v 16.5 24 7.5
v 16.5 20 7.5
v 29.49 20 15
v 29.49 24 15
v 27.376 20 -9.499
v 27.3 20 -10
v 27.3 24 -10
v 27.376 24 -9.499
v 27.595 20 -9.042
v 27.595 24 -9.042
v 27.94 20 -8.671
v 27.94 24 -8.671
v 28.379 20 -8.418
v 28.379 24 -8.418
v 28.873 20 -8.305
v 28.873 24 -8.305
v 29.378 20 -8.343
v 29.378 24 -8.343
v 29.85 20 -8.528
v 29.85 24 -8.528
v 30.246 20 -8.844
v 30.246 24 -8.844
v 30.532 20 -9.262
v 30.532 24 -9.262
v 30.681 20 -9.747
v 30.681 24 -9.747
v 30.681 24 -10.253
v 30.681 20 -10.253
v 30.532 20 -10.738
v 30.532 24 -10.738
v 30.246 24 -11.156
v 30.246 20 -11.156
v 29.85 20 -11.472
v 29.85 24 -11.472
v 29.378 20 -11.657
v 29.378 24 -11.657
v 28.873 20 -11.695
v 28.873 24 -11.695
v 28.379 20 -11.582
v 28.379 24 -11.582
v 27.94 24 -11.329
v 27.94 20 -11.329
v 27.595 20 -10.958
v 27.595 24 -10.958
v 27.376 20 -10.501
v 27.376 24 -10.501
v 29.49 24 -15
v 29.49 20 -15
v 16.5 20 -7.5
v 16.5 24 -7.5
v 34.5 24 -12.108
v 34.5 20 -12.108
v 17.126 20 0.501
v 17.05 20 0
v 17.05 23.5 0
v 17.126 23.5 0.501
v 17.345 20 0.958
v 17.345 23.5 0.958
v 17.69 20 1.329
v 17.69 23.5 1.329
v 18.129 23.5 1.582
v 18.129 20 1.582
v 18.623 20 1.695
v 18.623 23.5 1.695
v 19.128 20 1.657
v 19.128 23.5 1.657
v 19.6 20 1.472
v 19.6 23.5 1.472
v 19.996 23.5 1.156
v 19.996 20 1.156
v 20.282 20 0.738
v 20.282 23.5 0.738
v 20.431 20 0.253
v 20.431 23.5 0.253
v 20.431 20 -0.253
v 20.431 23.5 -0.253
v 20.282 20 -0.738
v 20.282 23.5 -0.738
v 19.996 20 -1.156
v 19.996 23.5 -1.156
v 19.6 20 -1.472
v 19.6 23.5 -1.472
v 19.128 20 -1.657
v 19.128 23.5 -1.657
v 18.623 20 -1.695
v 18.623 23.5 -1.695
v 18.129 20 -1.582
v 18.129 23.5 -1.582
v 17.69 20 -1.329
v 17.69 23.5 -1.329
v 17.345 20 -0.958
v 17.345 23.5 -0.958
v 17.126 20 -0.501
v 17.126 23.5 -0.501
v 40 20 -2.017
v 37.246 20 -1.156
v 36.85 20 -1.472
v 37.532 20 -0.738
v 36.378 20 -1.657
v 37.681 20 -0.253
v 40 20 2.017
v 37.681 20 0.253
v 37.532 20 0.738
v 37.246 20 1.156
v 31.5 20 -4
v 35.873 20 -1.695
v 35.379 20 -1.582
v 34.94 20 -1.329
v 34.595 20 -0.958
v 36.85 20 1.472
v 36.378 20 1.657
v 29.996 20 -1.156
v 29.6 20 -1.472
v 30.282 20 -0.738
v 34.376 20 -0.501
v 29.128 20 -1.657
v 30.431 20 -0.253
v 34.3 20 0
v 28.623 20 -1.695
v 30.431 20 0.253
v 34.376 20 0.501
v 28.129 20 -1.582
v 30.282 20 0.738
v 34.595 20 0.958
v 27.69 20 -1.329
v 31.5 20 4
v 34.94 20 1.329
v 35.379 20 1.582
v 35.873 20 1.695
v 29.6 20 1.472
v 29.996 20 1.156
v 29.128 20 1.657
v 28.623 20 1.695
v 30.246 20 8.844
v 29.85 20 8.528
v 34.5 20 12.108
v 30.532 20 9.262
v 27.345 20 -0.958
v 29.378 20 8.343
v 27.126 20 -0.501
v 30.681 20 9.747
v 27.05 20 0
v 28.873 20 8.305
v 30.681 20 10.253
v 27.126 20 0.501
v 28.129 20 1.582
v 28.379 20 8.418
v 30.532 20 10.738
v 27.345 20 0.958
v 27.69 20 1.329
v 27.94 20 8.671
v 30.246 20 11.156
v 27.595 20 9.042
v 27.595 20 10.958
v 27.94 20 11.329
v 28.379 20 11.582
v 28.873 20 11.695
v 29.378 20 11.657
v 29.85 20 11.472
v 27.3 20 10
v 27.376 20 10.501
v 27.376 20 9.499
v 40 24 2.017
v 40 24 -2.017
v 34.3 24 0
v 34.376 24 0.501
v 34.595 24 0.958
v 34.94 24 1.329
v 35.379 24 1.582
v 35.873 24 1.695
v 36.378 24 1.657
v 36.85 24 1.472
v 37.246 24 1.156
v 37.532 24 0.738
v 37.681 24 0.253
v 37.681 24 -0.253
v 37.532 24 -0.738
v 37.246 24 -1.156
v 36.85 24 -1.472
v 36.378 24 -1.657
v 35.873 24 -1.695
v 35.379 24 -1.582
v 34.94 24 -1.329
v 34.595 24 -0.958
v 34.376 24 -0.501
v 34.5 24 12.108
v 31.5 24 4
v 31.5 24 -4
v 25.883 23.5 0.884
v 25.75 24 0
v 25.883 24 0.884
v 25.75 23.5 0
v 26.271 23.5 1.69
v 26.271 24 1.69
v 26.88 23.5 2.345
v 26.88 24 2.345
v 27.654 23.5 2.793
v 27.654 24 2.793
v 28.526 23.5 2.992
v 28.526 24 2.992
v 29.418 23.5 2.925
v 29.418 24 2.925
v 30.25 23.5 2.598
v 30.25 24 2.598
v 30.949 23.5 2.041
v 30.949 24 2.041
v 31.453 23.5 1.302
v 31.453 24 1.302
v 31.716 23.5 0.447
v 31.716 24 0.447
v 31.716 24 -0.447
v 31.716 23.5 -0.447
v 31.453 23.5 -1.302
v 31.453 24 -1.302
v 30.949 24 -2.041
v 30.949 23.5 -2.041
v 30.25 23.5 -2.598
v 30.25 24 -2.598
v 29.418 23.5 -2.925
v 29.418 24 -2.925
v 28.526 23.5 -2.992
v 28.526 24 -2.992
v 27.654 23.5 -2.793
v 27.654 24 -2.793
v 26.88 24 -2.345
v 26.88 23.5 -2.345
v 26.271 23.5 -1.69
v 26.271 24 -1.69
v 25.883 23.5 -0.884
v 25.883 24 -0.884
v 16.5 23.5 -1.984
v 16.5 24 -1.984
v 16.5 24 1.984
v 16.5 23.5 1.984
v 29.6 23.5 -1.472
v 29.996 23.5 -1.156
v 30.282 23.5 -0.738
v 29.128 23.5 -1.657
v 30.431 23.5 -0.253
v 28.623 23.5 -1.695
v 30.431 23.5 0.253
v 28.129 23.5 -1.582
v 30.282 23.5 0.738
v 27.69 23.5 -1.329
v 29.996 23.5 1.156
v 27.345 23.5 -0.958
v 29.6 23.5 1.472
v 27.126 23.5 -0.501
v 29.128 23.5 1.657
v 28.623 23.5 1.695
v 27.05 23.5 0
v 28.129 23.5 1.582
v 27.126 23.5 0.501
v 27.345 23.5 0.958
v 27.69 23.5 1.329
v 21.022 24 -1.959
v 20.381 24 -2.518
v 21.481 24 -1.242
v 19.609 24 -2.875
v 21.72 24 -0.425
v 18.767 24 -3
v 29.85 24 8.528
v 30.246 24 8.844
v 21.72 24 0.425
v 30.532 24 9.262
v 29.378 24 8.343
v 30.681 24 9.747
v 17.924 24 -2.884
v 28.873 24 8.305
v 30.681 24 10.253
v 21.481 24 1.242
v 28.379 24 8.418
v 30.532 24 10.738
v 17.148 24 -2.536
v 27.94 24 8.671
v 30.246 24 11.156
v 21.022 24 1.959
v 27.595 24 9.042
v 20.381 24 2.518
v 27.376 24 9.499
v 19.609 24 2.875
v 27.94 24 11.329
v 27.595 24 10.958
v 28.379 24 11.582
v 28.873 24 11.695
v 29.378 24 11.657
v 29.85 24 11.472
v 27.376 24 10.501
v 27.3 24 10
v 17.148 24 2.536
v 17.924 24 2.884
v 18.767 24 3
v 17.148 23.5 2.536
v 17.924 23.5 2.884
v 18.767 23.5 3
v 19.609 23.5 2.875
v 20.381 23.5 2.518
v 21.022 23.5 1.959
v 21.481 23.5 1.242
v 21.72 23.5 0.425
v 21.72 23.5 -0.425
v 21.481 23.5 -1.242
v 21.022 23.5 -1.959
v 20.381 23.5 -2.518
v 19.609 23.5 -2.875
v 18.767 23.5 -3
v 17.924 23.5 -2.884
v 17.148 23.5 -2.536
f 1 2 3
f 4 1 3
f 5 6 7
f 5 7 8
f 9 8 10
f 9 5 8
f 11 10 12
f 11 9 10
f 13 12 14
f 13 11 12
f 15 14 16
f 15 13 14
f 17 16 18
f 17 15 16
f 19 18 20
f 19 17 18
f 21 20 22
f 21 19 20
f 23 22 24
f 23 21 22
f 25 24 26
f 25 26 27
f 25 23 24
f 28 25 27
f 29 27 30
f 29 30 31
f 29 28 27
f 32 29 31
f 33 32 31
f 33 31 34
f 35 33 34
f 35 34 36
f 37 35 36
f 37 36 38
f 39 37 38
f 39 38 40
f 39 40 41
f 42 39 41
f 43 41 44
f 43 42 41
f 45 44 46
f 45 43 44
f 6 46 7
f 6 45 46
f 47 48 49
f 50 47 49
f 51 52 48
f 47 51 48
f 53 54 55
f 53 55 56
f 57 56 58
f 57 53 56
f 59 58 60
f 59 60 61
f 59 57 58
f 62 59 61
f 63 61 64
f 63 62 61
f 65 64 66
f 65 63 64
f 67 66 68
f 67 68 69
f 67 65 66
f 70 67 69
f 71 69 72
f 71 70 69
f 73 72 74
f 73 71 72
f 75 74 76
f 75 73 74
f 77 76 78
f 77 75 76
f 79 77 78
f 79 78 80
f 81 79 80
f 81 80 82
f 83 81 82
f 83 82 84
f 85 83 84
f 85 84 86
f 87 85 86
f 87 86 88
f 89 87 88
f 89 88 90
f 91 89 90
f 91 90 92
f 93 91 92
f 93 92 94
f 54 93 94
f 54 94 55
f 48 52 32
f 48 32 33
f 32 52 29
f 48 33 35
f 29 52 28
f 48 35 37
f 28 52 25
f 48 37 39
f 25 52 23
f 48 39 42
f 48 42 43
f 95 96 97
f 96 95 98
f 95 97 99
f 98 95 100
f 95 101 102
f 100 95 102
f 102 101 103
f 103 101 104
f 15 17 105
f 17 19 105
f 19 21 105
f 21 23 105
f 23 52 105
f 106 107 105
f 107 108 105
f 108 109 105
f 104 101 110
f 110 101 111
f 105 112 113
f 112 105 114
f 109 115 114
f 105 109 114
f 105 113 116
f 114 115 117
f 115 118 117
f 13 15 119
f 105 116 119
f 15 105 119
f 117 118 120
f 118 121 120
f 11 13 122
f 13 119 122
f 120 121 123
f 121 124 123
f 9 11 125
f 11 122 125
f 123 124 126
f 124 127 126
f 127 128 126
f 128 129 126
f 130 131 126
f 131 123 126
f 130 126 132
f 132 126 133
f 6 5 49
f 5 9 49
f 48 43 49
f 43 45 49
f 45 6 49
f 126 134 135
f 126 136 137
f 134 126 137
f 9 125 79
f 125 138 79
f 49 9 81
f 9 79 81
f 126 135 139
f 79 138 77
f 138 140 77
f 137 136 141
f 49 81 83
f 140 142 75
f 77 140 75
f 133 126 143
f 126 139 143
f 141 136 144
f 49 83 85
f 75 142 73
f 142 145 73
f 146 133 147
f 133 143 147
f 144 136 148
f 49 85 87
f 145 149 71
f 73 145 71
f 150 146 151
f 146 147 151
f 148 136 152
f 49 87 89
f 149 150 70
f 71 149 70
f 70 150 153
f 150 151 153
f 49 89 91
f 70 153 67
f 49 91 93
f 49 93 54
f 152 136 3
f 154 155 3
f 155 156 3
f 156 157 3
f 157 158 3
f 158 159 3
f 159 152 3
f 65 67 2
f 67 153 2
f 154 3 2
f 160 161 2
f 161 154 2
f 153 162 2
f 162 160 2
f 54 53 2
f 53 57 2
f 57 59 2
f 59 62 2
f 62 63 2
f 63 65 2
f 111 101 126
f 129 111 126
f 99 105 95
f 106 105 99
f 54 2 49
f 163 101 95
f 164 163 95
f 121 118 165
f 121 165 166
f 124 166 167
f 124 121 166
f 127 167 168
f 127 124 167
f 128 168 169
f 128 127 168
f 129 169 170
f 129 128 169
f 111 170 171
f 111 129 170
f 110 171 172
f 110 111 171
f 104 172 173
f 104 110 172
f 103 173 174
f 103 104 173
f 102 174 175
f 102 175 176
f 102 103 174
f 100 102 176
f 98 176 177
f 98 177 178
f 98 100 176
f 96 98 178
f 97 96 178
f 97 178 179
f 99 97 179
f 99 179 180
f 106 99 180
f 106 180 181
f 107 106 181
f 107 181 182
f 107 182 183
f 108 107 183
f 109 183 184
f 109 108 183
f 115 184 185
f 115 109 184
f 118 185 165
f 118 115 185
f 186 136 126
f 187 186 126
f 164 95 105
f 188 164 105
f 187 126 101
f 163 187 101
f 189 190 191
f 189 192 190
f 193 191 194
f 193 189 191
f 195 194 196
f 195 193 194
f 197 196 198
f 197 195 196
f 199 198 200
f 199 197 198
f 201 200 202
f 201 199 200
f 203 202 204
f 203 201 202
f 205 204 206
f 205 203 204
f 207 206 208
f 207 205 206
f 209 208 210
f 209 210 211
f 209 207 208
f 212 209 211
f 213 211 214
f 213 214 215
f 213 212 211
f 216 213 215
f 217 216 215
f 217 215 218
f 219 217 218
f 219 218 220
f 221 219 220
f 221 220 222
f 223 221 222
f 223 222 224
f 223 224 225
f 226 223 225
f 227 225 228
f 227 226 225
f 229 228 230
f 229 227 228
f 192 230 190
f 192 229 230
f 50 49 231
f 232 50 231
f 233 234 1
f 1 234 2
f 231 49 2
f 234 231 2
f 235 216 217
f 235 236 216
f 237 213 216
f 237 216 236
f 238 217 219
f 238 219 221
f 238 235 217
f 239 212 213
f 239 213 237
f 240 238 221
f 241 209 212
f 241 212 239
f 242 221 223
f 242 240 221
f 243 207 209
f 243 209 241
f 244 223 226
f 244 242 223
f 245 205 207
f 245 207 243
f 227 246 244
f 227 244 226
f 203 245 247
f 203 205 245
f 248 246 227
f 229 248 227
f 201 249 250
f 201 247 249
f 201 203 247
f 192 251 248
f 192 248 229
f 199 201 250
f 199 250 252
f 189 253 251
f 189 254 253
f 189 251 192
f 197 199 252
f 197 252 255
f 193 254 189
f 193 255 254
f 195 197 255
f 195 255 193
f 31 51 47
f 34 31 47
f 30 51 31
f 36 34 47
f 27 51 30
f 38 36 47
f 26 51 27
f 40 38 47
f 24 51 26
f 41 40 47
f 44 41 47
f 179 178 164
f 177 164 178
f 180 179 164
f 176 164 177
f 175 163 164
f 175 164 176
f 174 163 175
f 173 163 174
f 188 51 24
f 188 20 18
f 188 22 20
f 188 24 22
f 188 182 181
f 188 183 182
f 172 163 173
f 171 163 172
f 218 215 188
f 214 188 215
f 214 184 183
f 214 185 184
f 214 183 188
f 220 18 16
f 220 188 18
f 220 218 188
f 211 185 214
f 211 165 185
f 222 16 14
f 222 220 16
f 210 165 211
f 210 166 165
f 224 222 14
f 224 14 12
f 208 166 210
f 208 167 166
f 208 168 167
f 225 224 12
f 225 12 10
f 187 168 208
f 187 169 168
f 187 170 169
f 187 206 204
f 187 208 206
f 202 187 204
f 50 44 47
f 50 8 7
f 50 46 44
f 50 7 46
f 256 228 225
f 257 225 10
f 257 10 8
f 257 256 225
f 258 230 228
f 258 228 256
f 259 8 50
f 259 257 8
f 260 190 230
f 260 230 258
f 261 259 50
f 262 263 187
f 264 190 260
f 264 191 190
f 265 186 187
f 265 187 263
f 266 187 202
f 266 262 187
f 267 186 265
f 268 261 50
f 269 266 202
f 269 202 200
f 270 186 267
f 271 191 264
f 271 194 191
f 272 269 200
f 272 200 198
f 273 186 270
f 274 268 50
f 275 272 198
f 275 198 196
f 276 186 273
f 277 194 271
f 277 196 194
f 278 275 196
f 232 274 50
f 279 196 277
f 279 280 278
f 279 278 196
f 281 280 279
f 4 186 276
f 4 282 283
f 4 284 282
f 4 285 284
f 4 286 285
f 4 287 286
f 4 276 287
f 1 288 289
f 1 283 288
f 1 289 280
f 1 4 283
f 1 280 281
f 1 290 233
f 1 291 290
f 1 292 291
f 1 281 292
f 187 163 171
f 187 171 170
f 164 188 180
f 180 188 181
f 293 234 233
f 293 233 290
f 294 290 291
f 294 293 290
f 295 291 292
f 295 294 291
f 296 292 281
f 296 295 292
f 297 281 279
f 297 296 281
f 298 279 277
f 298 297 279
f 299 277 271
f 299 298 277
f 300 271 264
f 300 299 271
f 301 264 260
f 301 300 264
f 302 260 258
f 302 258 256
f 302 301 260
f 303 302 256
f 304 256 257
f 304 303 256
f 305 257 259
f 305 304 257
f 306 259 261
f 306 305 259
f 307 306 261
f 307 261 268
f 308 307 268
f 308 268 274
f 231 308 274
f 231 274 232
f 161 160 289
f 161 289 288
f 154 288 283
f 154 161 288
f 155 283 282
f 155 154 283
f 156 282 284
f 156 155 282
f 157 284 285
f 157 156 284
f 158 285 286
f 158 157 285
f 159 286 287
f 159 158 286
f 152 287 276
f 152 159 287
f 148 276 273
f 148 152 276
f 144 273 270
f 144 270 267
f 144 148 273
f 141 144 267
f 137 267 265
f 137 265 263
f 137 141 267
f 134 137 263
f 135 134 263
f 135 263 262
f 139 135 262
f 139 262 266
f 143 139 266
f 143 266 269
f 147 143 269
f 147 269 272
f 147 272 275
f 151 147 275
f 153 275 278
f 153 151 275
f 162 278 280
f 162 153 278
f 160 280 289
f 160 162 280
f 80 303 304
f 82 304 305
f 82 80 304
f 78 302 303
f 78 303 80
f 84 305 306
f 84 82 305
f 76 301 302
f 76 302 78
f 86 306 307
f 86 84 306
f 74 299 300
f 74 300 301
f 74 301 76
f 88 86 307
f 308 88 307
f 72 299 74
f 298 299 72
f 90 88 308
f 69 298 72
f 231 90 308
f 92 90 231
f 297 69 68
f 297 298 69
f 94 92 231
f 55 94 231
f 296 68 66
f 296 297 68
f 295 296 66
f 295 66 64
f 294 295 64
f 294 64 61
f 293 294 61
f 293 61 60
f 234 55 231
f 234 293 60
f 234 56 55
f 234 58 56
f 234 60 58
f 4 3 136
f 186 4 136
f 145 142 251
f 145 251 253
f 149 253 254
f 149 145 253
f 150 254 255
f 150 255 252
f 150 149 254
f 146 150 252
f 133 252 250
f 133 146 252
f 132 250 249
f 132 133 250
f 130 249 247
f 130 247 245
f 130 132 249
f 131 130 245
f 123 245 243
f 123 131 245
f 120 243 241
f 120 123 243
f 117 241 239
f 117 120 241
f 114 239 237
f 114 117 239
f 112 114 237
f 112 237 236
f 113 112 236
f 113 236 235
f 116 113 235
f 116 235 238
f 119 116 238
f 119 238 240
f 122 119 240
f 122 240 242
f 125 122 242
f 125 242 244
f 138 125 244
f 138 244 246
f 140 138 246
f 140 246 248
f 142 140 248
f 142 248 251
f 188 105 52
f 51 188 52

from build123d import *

# Parameters (mm, degrees)
SKETCH122_R       = 3
PAD096_DEPTH      = 2.5
PAD096_DEPTH_BACK = 100
SKETCH096_R       = 1.7
PAD073_DEPTH      = 4


with BuildPart() as countersink:
    # Sketch122 → Pad096 (new body, two sides)
    with BuildSketch(Plane.XZ.offset(-26)) as pad096_sk:
        with Locations((-18.75, 0)):
            Circle(SKETCH122_R)
        with Locations((-28.75, 0)):
            Circle(SKETCH122_R)
    extrude(amount=PAD096_DEPTH)
    extrude(pad096_sk.sketch, amount=-PAD096_DEPTH_BACK)


with BuildPart() as differentialmountadapter:
    # Sketch096 → Pad073 (new body)
    with BuildSketch(Plane.XZ.offset(-20)):
        Polygon((-16.5, 7.5), (-29.490381, 15), (-34.5, 12.107695), (-31.5, 4), (-40, 2.016667), (-40, -2.016667), (-31.5, -4), (-34.5, -12.107695), (-29.490381, -15), (-16.5, -7.5), align=None)
        with Locations((-18.75, 0)):
            Circle(SKETCH096_R, mode=Mode.SUBTRACT)
        with Locations((-28.75, 0)):
            Circle(SKETCH096_R, mode=Mode.SUBTRACT)
        with Locations((-29, 10)):
            Circle(SKETCH096_R, mode=Mode.SUBTRACT)
        with Locations((-29, -10)):
            Circle(SKETCH096_R, mode=Mode.SUBTRACT)
        with Locations((-36, 0)):
            Circle(SKETCH096_R, mode=Mode.SUBTRACT)
    extrude(amount=-PAD073_DEPTH)

    # Cut007019007: cut Countersink
    add(countersink.part, mode=Mode.SUBTRACT)


with BuildPart() as part_mirroring005:
    # Part__Mirroring005: instance of DifferentialMountAdapter
    add(differentialmountadapter.part.mirror(Plane(origin=(0, 0, 0), x_dir=(0, -1, 0), z_dir=(1, 0, 0))))


solid = part_mirroring005.part
